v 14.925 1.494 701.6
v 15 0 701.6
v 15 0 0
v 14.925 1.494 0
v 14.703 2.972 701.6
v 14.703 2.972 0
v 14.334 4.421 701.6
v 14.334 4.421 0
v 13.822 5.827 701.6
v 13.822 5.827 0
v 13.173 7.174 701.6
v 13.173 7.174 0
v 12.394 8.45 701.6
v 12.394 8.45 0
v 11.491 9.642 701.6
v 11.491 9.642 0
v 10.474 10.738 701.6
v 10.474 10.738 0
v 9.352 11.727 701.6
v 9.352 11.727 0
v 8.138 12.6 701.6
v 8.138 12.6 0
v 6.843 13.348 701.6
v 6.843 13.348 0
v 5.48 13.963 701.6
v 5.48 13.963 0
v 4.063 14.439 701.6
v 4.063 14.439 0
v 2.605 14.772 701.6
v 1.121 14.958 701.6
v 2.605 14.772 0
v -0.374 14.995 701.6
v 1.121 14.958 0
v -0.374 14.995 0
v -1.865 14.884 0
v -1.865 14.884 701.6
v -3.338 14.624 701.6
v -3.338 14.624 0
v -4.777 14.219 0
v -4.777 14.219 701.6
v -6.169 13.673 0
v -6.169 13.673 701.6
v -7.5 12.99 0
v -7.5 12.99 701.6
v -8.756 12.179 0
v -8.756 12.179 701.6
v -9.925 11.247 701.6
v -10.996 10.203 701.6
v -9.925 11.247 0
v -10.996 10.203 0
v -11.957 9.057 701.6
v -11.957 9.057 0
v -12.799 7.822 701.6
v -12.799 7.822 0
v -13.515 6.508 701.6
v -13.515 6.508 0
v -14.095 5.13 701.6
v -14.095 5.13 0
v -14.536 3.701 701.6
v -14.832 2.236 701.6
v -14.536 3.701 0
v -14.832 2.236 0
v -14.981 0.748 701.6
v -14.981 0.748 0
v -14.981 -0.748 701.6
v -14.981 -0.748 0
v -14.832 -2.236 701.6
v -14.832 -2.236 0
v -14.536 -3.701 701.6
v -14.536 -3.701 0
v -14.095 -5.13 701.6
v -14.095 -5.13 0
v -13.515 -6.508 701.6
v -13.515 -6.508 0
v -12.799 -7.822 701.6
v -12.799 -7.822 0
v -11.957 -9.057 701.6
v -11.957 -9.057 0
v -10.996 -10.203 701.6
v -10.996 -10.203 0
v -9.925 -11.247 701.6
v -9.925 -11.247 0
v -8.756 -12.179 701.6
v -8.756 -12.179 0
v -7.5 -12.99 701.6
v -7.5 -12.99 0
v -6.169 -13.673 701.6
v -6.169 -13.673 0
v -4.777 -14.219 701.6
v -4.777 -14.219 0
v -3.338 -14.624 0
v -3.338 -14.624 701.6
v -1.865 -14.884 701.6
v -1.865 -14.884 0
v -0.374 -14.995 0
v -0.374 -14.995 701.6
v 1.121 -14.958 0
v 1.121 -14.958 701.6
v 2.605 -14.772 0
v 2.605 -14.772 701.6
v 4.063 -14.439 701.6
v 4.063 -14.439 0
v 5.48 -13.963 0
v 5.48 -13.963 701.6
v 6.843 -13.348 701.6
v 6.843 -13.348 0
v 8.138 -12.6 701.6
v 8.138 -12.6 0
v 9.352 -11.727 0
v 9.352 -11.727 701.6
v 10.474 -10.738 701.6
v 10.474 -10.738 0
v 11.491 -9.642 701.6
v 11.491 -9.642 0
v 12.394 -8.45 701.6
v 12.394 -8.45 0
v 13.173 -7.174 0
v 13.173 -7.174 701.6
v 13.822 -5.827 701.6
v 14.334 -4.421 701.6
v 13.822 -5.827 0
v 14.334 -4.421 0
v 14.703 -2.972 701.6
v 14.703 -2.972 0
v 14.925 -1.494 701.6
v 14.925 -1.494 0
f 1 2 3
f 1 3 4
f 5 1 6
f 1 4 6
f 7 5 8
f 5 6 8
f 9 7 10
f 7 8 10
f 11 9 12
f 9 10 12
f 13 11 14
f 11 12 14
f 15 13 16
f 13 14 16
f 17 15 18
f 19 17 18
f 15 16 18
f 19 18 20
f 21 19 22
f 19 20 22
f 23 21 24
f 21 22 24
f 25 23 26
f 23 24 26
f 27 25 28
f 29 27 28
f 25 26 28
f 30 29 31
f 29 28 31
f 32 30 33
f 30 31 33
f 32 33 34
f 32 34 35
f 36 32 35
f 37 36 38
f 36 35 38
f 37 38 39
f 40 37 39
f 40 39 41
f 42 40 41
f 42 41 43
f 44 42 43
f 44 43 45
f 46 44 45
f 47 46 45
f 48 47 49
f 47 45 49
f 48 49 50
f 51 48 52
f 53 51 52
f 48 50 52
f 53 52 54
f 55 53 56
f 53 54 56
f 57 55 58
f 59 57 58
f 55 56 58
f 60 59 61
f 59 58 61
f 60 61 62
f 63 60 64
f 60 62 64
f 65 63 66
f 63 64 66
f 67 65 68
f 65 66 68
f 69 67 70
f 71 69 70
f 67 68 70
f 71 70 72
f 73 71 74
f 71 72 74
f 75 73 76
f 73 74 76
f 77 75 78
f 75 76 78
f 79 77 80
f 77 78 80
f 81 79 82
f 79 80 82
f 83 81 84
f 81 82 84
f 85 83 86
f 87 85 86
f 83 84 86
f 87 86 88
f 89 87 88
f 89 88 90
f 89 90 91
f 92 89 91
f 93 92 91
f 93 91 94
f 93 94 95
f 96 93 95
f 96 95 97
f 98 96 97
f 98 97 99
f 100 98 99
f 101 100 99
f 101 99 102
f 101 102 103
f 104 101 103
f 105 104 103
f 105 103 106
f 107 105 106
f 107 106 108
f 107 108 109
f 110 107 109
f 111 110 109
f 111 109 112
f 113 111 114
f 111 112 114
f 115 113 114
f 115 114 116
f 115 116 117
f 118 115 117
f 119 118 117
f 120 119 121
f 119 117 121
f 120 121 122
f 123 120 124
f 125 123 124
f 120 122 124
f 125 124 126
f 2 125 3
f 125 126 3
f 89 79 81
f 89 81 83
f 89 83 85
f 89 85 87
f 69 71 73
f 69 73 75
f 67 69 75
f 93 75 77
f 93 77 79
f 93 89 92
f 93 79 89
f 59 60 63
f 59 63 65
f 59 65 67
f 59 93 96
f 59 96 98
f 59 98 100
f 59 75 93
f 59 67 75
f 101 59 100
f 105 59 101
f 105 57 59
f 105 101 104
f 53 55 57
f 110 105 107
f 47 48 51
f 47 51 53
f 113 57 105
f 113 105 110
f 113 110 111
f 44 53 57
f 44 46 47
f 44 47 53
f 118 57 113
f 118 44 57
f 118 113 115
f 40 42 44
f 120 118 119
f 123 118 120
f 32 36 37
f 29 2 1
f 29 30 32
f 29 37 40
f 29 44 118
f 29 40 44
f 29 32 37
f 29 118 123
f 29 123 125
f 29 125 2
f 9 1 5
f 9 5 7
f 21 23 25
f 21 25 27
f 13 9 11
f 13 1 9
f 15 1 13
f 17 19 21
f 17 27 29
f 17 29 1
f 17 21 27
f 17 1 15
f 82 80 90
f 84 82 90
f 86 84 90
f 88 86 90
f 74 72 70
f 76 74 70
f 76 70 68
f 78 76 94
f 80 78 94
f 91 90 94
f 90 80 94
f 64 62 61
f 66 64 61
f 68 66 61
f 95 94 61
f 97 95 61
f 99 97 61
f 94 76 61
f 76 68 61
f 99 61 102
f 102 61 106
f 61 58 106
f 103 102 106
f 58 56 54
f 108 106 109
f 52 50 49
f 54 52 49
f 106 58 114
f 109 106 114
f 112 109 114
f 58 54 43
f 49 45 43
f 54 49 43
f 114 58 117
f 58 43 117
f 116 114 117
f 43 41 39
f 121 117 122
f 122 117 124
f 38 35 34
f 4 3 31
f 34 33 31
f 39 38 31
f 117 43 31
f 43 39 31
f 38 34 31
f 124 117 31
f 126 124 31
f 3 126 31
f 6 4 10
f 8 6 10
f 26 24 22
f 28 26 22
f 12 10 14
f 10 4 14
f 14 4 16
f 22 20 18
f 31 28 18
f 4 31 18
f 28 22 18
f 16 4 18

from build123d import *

# Parameters (mm, degrees)
F0_R     = 15
F1_DEPTH = 25.4
F2_DEPTH = 600
F3_DEPTH = 25.4
F4_DEPTH = 25.4
F5_DEPTH = 25.4


with BuildPart() as f1:
    # F0 (on Top) → F1 (new body)
    with BuildSketch(Plane.XY):
        Circle(F0_R)
    extrude(amount=F1_DEPTH)

    # F2 (add): a face of the model
    f2_faces = [f1.faces().sort_by_distance(p)[0] for p in [
        (0, 0, 25.4),
    ]]
    extrude(f2_faces, amount=F2_DEPTH)

    # F3 (add): a face of the model
    f3_faces = [f1.faces().sort_by_distance(p)[0] for p in [
        (0, 0, 625.4),
    ]]
    extrude(f3_faces, amount=F3_DEPTH)

    # F4 (add): faces of the model
    f4_faces = [f1.faces().sort_by_distance(p)[0] for p in [
        (0, 0, 650.8),
        (0, 0, 0),
    ]]
    extrude(f4_faces, amount=F4_DEPTH, dir=(0, 0, 1))

    # F5 (add): a face of the model
    f5_faces = [f1.faces().sort_by_distance(p)[0] for p in [
        (0, 0, 676.2),
    ]]
    extrude(f5_faces, amount=F5_DEPTH)


solid = f1.part
